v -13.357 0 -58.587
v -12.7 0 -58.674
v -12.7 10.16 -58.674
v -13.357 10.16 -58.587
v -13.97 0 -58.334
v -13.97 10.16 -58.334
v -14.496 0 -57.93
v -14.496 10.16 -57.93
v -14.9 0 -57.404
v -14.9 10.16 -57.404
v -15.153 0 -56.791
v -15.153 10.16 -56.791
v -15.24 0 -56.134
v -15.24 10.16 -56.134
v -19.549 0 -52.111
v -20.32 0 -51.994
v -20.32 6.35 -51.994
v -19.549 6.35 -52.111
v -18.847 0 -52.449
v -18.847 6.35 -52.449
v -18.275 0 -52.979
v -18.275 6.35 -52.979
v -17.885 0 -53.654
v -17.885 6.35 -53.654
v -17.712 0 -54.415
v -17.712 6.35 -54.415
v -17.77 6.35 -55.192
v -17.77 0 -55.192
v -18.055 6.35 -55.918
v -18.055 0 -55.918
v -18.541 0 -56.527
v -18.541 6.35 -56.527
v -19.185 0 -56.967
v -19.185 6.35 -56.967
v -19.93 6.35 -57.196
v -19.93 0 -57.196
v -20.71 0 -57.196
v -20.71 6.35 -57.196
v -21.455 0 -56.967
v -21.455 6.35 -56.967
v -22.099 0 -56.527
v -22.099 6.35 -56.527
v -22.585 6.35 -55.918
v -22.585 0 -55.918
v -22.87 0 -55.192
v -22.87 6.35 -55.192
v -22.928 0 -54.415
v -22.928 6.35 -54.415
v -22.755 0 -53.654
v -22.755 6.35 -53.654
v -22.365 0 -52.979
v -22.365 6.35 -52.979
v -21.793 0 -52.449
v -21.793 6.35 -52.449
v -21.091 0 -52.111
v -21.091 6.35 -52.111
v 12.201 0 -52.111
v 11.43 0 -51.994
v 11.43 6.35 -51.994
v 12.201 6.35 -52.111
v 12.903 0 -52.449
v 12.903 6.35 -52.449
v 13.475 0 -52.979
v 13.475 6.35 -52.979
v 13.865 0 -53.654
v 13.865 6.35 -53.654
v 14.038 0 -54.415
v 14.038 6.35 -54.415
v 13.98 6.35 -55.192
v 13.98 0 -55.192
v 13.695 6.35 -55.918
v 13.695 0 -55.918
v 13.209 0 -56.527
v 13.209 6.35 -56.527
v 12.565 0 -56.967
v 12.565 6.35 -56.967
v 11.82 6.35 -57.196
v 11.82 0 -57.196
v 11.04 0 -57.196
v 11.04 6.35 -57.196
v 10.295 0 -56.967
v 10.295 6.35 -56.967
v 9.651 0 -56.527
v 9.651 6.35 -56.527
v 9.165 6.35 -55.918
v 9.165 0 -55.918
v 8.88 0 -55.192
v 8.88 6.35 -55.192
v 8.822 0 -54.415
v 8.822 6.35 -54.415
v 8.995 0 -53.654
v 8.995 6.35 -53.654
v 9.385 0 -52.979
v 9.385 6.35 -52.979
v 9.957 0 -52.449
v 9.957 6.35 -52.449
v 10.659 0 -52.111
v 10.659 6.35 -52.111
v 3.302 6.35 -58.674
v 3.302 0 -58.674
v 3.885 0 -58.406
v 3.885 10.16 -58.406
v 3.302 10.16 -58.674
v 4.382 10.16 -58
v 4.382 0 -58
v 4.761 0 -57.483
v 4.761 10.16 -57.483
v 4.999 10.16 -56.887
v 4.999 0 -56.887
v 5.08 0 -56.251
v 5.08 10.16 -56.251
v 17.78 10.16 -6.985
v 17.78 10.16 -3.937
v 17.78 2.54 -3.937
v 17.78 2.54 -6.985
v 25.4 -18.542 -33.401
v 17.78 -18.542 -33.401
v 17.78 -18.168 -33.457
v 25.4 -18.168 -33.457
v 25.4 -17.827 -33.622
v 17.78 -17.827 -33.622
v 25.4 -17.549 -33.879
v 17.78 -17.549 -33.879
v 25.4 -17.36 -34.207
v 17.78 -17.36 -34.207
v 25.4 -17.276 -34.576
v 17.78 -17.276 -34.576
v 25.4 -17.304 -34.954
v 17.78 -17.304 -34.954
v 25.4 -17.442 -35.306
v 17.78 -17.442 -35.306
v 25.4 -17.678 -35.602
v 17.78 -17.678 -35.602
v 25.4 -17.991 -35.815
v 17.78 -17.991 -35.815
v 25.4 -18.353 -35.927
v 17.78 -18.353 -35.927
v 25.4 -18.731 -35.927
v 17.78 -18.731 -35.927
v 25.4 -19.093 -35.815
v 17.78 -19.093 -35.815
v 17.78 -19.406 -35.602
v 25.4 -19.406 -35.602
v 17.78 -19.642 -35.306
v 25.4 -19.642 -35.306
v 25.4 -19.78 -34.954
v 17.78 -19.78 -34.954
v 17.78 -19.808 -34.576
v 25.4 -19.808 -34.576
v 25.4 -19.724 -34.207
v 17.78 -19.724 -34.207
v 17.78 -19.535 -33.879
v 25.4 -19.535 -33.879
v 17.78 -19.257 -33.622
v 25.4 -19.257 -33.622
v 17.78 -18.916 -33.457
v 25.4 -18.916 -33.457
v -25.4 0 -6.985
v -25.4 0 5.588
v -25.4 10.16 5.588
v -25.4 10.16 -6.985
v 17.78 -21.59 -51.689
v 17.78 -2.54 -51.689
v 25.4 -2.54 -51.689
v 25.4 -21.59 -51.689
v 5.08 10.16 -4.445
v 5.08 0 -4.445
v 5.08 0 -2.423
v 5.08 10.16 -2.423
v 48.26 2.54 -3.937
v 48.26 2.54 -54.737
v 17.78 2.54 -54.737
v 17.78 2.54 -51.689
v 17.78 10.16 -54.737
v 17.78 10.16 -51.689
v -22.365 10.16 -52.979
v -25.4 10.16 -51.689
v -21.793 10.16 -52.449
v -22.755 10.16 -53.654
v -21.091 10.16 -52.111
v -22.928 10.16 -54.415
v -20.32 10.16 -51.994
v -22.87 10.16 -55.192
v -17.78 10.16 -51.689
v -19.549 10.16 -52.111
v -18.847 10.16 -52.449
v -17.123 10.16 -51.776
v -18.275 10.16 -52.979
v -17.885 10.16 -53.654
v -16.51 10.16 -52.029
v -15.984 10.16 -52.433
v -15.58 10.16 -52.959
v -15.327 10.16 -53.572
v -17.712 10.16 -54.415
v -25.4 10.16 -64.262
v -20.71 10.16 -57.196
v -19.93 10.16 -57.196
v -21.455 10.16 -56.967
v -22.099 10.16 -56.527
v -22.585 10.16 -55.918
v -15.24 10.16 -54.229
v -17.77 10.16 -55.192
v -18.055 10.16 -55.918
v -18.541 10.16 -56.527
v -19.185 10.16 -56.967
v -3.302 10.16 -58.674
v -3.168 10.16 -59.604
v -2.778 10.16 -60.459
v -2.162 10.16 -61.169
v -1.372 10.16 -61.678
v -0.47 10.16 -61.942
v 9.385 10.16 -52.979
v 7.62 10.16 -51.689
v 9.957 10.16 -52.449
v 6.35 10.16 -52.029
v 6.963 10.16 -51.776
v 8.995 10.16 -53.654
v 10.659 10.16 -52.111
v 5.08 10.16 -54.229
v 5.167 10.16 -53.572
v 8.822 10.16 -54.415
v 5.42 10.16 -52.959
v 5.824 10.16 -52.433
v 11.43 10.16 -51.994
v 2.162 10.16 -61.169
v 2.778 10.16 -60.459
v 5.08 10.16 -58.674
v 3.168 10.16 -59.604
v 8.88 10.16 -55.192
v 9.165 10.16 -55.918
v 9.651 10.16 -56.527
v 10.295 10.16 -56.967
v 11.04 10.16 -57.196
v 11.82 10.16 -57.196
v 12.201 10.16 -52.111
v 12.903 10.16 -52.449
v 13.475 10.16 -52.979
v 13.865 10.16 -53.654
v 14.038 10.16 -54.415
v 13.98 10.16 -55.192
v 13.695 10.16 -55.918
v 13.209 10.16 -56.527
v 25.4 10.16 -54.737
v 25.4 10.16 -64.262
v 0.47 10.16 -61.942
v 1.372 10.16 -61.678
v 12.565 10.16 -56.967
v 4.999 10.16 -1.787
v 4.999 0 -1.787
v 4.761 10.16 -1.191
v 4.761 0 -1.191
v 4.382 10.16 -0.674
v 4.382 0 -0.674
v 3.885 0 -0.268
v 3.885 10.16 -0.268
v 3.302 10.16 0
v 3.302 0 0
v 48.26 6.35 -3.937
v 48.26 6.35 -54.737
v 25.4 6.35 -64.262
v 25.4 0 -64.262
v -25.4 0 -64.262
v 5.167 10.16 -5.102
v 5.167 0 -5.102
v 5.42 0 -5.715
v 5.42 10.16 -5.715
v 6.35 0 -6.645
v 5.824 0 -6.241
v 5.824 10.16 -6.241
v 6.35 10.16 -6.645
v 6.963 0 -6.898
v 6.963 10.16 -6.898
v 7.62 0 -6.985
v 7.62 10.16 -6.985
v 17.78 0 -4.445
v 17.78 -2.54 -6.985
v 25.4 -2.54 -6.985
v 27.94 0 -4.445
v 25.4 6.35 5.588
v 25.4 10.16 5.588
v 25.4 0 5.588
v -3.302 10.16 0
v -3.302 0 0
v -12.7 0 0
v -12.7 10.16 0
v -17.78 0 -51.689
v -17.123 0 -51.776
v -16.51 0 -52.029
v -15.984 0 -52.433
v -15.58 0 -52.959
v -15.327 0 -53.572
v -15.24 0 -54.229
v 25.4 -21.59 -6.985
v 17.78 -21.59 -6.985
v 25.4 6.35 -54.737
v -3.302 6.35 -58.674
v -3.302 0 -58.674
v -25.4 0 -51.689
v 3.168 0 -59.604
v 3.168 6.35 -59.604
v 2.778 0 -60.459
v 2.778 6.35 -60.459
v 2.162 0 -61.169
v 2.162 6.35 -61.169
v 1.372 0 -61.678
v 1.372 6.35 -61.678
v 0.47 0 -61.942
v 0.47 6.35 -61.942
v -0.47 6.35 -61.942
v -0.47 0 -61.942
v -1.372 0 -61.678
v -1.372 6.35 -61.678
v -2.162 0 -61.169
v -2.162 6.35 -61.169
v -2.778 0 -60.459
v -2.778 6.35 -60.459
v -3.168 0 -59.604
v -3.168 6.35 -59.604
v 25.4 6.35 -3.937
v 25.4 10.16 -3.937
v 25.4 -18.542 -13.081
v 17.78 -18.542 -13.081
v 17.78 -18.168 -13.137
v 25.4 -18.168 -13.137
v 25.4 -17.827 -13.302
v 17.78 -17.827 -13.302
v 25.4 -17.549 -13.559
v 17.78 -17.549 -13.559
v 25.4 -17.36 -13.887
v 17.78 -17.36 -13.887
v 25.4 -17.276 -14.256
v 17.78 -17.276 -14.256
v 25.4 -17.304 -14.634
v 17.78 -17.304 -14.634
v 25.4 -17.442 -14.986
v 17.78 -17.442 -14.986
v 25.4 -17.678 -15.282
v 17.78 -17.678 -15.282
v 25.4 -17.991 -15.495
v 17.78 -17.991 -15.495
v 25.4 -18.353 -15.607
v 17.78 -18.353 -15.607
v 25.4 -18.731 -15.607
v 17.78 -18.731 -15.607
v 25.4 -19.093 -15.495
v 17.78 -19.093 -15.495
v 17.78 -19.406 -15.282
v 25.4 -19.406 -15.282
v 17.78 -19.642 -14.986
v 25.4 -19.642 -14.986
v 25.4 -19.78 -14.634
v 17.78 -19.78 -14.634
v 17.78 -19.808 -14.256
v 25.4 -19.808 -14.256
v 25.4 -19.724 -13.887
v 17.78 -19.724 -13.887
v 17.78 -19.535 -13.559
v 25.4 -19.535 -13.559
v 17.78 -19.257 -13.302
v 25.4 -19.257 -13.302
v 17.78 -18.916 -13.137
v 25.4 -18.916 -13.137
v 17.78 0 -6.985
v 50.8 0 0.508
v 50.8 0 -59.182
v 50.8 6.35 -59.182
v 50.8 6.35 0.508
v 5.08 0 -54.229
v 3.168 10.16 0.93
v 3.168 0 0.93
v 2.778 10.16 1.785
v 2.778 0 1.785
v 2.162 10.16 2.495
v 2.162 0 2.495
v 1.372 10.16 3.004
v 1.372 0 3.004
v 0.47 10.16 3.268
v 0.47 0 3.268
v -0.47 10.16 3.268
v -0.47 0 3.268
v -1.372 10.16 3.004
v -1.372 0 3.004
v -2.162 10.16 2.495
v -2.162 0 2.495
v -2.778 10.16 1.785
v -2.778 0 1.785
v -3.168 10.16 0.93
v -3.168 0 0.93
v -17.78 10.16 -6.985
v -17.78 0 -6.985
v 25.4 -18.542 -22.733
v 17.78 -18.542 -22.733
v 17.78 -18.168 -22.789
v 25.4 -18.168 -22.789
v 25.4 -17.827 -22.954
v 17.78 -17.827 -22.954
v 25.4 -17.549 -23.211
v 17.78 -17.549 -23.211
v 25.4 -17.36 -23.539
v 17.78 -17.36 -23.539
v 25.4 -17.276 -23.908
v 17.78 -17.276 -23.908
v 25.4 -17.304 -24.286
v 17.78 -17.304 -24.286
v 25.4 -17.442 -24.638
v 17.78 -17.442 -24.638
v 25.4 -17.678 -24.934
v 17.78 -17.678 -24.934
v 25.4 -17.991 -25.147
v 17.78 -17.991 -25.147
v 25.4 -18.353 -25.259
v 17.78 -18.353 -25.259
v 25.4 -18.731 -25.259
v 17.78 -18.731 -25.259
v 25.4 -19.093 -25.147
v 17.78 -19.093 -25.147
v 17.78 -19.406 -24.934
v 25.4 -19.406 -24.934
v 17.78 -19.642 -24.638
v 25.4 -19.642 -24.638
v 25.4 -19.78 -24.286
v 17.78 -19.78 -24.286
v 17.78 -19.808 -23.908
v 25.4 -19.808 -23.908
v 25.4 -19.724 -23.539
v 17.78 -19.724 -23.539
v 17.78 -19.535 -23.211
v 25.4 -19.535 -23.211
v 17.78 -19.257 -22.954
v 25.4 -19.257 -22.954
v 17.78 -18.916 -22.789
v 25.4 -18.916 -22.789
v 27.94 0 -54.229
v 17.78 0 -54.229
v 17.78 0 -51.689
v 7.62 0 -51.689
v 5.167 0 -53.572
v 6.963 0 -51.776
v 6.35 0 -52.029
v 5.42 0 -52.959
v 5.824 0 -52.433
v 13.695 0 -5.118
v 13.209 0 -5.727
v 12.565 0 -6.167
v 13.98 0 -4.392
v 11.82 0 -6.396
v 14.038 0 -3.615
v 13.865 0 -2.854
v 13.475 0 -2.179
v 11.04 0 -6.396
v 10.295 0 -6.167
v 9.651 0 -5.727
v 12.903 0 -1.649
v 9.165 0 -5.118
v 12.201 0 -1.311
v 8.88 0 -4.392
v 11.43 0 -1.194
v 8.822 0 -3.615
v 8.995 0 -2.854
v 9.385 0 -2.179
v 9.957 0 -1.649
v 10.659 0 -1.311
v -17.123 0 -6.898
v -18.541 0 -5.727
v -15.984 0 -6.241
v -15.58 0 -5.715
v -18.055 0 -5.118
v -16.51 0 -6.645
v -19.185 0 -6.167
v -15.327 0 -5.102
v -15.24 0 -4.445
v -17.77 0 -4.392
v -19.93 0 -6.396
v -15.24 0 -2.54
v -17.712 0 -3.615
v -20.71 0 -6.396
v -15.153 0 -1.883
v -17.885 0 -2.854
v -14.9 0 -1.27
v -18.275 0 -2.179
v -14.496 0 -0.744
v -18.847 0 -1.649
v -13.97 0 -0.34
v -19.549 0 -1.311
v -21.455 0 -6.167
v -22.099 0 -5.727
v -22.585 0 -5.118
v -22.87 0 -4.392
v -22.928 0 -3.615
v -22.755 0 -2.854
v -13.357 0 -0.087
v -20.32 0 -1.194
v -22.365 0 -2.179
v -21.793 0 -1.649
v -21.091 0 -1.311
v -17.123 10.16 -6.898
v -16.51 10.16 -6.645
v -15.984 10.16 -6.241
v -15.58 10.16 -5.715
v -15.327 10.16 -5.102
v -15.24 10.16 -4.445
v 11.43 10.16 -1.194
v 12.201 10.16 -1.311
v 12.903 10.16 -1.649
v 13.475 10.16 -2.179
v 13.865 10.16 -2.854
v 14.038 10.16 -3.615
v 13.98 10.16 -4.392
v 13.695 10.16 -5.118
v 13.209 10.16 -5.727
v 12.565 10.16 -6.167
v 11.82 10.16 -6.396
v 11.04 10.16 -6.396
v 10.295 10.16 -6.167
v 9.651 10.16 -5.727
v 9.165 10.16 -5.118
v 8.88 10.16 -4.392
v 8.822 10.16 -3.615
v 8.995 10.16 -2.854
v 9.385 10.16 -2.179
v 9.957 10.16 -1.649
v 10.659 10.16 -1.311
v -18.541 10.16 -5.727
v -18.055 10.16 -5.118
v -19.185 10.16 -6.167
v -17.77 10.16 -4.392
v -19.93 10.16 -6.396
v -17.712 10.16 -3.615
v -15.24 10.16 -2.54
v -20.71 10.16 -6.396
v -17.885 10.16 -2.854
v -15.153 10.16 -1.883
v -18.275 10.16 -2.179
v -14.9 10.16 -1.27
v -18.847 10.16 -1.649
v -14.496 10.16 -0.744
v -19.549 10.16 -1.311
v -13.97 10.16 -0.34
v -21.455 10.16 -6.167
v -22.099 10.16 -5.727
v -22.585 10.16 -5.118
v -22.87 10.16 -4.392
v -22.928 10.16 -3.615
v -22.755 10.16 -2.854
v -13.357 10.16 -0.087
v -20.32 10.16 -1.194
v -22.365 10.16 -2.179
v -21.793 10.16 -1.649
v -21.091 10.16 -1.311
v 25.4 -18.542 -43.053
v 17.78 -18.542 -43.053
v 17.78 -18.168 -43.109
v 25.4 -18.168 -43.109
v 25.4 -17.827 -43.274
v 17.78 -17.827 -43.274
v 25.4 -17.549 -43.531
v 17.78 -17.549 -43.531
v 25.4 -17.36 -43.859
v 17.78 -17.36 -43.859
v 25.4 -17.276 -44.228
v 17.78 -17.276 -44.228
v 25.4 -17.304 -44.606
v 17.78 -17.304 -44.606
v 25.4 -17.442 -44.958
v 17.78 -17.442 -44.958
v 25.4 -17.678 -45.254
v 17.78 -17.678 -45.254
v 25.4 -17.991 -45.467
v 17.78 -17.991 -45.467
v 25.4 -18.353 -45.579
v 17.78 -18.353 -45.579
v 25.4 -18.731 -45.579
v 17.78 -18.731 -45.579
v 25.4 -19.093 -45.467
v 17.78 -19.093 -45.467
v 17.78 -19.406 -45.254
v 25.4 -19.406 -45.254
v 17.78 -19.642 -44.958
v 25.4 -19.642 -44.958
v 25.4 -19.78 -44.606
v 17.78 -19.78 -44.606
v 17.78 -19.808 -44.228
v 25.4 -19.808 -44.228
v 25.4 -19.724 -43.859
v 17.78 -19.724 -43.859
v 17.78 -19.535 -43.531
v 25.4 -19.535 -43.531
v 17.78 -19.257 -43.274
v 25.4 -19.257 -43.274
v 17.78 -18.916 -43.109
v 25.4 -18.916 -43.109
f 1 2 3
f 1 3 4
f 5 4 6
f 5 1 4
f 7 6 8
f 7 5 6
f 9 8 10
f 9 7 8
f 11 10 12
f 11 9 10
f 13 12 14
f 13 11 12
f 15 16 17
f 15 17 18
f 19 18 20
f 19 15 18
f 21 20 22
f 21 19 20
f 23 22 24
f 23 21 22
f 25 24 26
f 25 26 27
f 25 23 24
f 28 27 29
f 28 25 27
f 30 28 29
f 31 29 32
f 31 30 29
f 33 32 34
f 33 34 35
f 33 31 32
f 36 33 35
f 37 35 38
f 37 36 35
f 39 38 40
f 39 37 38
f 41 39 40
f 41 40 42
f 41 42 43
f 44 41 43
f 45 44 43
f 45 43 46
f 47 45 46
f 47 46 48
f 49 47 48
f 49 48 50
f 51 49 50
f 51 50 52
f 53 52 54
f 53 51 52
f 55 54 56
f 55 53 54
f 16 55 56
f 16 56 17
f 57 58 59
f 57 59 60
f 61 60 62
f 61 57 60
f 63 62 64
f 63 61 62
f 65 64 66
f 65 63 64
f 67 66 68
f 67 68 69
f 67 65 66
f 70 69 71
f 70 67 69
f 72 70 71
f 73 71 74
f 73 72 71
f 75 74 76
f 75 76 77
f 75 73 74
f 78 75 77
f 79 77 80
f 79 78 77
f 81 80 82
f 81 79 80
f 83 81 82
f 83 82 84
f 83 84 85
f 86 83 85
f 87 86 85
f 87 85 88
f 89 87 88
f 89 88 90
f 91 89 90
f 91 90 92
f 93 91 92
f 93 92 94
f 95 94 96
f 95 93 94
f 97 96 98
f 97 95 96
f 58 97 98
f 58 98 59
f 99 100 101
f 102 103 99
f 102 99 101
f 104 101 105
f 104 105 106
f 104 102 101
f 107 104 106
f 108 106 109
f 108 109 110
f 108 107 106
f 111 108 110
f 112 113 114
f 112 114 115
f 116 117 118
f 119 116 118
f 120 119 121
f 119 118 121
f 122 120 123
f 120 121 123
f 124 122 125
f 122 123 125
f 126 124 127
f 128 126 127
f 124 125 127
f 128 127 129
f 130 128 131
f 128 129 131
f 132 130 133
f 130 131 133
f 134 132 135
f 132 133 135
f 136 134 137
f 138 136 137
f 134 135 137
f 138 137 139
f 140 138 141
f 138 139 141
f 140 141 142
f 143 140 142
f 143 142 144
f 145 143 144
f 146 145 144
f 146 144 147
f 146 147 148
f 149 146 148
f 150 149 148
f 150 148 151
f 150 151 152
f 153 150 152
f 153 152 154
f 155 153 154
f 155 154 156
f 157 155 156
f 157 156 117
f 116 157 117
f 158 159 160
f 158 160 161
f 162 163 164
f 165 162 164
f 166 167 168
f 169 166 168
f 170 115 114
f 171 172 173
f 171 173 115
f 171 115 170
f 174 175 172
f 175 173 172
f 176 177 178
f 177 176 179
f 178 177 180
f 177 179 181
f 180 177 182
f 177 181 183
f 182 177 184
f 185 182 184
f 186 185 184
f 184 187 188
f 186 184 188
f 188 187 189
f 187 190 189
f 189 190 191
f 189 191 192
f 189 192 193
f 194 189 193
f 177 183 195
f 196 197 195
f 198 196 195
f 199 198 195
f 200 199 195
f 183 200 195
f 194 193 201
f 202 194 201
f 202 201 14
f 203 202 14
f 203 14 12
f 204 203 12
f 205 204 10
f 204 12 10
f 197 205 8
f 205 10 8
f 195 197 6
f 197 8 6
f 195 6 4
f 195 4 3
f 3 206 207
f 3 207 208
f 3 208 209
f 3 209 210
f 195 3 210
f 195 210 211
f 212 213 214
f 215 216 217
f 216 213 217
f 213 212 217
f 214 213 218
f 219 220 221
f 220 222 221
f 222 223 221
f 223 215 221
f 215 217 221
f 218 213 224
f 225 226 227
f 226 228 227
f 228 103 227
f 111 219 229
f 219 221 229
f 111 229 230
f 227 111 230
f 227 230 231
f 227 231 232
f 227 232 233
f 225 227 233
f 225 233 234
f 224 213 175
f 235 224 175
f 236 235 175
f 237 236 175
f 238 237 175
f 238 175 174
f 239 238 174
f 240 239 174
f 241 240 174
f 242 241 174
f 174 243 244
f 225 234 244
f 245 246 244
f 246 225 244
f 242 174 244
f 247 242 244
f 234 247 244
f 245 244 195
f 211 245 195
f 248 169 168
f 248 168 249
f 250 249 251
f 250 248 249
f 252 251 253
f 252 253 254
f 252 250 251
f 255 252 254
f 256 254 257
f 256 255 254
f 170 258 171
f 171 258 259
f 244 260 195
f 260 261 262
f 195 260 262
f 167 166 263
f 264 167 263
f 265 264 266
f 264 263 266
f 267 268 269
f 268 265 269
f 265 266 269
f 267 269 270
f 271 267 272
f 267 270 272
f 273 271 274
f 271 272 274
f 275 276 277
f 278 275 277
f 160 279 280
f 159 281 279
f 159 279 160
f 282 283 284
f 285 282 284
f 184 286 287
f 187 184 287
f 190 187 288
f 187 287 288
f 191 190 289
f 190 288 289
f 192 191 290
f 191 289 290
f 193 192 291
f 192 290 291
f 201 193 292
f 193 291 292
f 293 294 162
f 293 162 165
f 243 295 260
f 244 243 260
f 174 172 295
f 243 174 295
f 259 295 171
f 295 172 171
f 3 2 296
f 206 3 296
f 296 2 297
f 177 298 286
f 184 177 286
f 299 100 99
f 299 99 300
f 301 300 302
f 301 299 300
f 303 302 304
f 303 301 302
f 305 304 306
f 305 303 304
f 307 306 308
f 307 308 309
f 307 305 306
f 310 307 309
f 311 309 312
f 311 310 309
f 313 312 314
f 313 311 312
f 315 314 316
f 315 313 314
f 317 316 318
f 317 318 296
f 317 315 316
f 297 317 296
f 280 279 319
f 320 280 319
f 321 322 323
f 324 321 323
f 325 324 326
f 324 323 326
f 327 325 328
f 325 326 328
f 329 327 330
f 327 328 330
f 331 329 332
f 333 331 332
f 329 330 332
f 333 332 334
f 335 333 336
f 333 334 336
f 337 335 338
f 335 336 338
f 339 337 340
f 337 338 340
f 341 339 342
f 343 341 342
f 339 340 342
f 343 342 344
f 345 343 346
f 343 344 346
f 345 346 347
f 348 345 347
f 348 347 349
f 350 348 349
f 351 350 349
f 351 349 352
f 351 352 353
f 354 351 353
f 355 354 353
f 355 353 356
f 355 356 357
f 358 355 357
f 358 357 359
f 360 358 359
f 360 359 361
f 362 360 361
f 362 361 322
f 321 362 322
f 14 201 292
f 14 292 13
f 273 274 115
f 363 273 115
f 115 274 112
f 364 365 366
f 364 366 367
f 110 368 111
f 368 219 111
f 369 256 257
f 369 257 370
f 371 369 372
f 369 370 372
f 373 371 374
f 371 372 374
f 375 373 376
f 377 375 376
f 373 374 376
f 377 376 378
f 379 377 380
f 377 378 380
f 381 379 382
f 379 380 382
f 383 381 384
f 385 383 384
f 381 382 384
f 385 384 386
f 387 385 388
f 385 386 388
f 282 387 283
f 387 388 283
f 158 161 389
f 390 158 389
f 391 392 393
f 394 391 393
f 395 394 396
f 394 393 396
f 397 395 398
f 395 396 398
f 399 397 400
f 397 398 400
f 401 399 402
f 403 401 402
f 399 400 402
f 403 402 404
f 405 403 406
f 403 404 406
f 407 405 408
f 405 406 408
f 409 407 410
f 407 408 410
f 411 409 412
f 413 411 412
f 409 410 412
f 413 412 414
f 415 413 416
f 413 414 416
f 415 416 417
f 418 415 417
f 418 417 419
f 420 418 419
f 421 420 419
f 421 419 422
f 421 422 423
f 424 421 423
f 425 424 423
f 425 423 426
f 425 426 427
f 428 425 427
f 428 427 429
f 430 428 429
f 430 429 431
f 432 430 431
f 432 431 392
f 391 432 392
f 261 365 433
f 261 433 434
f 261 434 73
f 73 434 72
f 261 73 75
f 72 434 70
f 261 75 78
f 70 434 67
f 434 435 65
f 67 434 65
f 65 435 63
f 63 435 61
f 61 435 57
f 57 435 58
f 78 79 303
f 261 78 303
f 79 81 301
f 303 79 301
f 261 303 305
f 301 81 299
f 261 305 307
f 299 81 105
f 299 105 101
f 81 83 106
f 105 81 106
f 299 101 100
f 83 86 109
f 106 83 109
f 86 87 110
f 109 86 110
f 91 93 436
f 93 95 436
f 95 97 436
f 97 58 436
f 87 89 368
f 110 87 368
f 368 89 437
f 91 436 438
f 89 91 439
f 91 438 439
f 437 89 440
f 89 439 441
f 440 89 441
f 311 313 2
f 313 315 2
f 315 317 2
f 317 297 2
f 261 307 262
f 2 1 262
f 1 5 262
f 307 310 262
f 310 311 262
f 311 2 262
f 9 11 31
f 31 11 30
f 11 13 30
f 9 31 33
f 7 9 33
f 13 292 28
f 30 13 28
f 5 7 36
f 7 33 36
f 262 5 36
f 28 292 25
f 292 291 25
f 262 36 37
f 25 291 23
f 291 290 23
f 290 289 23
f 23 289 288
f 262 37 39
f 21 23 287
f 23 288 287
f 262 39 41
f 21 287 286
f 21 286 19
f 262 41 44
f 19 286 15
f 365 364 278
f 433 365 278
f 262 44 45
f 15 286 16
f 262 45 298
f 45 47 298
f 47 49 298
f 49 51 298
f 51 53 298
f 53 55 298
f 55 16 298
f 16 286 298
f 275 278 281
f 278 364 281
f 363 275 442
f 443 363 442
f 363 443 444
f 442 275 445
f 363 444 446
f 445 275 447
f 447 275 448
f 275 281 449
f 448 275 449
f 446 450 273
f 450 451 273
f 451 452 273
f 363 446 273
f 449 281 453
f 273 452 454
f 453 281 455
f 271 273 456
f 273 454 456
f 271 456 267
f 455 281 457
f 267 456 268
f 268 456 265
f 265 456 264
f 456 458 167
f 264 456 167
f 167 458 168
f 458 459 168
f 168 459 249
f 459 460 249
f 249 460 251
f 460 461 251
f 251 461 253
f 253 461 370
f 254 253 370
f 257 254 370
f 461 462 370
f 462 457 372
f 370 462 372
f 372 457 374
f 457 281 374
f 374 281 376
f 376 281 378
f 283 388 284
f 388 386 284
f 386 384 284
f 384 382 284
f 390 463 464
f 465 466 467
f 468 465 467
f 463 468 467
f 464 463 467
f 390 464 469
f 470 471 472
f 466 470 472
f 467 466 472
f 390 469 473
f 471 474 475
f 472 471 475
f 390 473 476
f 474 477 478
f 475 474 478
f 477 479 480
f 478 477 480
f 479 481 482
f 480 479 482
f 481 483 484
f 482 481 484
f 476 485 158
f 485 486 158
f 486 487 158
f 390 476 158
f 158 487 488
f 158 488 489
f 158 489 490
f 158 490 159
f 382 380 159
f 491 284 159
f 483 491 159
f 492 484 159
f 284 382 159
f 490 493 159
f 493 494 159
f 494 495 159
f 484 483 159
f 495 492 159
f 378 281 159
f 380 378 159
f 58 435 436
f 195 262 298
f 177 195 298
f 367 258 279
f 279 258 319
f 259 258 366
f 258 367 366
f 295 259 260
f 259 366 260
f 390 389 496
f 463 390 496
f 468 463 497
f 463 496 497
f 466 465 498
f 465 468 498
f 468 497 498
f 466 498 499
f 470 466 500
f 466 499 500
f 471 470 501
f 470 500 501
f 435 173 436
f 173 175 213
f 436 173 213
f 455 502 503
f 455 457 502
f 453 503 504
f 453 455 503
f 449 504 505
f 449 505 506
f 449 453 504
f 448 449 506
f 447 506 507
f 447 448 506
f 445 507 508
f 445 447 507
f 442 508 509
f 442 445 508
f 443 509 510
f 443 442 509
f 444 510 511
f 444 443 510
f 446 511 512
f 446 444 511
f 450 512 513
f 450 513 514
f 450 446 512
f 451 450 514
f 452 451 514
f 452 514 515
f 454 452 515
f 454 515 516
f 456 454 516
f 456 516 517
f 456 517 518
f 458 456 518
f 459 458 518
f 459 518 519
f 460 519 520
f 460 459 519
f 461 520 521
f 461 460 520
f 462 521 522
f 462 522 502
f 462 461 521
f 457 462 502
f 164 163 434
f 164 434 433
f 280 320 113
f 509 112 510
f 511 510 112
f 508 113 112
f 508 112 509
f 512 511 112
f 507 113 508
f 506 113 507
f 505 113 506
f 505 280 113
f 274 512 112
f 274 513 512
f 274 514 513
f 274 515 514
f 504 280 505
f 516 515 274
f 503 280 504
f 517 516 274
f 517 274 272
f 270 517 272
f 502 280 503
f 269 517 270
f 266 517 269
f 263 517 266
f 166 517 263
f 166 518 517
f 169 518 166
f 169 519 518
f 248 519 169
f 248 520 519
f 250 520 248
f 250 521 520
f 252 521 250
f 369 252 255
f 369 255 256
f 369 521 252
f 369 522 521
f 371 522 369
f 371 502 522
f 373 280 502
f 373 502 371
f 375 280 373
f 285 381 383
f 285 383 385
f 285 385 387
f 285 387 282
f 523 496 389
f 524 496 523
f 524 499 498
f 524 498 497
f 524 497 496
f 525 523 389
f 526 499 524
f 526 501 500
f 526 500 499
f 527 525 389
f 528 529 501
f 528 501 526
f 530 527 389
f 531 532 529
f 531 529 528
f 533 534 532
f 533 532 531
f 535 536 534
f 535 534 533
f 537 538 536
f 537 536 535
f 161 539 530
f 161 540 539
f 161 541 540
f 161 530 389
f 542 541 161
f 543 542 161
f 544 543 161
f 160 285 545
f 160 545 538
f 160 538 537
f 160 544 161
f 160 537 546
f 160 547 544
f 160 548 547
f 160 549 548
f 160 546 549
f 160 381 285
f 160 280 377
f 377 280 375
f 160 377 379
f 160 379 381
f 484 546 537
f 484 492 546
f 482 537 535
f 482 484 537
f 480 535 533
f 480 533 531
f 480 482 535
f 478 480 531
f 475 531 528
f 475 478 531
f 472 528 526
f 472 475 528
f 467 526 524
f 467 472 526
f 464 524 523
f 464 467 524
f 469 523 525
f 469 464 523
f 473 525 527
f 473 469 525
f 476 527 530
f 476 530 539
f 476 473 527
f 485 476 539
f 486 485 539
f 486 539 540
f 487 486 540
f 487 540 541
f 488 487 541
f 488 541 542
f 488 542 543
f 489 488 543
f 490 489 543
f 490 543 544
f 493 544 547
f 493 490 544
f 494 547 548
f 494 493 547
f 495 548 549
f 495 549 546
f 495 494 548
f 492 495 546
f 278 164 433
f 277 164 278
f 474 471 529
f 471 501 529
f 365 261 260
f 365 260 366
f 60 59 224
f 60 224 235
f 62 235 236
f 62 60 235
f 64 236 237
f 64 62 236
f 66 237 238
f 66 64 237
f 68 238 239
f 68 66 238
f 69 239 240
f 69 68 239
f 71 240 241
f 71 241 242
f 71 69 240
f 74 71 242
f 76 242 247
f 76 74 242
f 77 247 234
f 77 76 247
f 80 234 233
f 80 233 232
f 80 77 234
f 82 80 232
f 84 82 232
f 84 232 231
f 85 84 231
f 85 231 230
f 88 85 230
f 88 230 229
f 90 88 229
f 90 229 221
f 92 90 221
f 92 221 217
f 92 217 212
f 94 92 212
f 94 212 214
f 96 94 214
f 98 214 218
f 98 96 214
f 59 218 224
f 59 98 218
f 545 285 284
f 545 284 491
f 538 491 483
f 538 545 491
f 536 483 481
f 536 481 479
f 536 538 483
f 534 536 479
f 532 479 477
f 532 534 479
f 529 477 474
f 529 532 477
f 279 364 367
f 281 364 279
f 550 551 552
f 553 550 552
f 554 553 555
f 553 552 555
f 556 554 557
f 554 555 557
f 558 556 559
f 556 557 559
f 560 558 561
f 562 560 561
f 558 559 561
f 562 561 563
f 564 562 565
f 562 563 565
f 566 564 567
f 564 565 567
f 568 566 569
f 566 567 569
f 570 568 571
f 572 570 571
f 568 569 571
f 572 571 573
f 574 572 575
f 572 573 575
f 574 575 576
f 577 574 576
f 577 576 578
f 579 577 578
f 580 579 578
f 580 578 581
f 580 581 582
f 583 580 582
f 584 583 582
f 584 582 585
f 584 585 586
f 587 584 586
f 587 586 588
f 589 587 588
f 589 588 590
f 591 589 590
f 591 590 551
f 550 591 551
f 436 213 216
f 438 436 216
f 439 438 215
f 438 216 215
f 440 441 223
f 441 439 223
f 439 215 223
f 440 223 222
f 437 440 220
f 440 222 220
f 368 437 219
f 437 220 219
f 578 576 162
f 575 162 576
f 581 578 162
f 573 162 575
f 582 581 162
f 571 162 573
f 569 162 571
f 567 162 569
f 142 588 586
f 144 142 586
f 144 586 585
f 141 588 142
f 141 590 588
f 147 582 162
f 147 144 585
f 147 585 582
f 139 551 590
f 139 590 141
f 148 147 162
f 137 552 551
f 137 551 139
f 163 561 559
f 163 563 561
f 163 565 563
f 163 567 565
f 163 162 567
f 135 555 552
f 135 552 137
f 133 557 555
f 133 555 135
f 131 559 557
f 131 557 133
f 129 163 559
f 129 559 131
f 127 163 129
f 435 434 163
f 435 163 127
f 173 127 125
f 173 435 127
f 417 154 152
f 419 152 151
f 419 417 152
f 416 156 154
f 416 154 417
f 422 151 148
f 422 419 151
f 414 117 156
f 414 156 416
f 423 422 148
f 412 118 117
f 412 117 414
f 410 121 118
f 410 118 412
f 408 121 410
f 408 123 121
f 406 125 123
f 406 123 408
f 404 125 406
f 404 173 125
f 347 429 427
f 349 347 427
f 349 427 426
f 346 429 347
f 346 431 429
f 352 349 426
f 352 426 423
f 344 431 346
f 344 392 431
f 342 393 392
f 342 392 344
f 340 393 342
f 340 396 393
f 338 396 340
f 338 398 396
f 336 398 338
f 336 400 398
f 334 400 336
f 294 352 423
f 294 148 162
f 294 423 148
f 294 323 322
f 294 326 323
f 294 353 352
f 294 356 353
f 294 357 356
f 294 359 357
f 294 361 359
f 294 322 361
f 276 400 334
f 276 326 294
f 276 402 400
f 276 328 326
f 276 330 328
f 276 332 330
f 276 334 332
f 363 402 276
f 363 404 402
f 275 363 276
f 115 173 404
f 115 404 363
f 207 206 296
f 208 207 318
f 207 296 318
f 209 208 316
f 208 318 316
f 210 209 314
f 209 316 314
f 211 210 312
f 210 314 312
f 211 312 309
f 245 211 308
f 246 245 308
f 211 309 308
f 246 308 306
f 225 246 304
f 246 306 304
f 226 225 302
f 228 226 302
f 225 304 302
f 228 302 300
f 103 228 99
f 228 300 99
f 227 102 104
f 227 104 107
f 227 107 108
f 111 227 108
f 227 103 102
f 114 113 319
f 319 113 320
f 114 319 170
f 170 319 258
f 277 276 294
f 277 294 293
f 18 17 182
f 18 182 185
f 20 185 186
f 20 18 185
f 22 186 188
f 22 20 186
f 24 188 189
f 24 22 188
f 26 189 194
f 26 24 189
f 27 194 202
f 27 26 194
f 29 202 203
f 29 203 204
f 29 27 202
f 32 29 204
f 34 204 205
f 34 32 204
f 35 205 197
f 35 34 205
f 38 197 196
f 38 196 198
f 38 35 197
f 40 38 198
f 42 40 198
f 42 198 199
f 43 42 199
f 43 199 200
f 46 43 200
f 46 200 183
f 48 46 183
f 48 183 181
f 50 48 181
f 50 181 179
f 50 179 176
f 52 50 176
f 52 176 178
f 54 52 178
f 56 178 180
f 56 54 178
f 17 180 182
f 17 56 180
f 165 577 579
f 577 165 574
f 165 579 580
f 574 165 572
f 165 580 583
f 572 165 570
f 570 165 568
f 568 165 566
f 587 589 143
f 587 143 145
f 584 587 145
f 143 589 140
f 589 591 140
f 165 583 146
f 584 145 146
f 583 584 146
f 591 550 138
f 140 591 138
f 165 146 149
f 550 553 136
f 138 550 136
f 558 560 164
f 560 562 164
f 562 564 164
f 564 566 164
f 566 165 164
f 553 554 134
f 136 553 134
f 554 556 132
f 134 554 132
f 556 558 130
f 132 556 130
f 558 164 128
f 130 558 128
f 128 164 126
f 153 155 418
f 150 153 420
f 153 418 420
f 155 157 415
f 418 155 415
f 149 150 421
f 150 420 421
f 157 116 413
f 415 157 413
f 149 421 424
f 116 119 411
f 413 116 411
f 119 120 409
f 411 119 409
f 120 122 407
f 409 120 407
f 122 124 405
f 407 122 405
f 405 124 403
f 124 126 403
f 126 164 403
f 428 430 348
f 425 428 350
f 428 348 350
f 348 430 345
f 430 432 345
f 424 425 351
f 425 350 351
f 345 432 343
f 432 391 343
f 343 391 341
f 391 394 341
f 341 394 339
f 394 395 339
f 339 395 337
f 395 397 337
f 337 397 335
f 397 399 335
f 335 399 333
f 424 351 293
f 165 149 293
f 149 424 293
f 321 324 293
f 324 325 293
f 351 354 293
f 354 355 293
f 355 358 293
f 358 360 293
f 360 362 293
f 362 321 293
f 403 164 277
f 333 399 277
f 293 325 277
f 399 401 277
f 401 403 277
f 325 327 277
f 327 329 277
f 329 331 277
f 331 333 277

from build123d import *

# Parameters (mm, degrees)
SKETCH1_R           = 3.302
SKETCH1_R_2         = 2.615549664
BOSS_EXTRUDE1_DEPTH = 6.35
SKETCH2_W           = 30.48
SKETCH2_H           = 50.8
CUT_EXTRUDE1_DEPTH  = 3.81
CUT_EXTRUDE2_DEPTH  = 83.161835082
SKETCH13_R          = 2.615549664
BOSS_EXTRUDE7_DEPTH = 3.81
SKETCH15_W          = 7.62
SKETCH15_H          = 44.704
BOSS_EXTRUDE8_DEPTH = 21.59
SKETCH16_R          = 1.27
CUT_EXTRUDE3_DEPTH  = 81.375650193
FILLET1_R           = 2.54
CHAMFER2_SIZE       = 2.54


with BuildPart() as part:
    # Sketch1 → Boss-Extrude1 (new body)
    with BuildSketch(Plane(origin=(0, 0, 0), x_dir=(1, 0, 0), z_dir=(0, 1, 0))):
        Polygon((50.8, -0.508), (25.4, -5.588), (-25.4, -5.588), (-25.4, 64.262), (25.4, 64.262), (50.8, 59.182), align=None)
        with Locations(Location((0, 0, 0), (0, 0, 270))):
            Circle(SKETCH1_R, mode=Mode.SUBTRACT)
        with Locations(Location((0, 58.674, 0), (0, 0, 270))):
            Circle(SKETCH1_R, mode=Mode.SUBTRACT)
        with Locations(Location((11.43, 54.61, 0), (0, 0, 270))):
            Circle(SKETCH1_R_2, mode=Mode.SUBTRACT)
        with Locations(Location((-20.32, 54.61, 0), (0, 0, 270))):
            Circle(SKETCH1_R_2, mode=Mode.SUBTRACT)
        with Locations(Location((-20.32, 3.81, 0), (0, 0, 270))):
            Circle(SKETCH1_R_2, mode=Mode.SUBTRACT)
        with Locations(Location((11.43, 3.81, 0), (0, 0, 270))):
            Circle(SKETCH1_R_2, mode=Mode.SUBTRACT)
    extrude(amount=BOSS_EXTRUDE1_DEPTH)

    # Sketch2 → Cut-Extrude1 (cut)
    with BuildSketch(Plane(origin=(0, 6.35, 0), x_dir=(1, 0, 0), z_dir=(0, 1, 0))):
        with Locations((33.02, 29.337)):
            Rectangle(SKETCH2_W, SKETCH2_H)
    extrude(amount=-CUT_EXTRUDE1_DEPTH, mode=Mode.SUBTRACT)

    # Sketch3 → Cut-Extrude2 (cut, through all)
    with BuildSketch(Plane(origin=(0, 6.35, 0), x_dir=(1, 0, 0), z_dir=(0, 1, 0))):
        with BuildLine():
            Line((-15.24, 58.674), (-15.24, 51.689))
            Line((-15.24, 51.689), (5.08, 51.689))
            Line((5.08, 51.689), (5.08, 58.674))
            Line((5.08, 58.674), (3.302, 58.674))
            ThreePointArc((3.302, 58.674), (0, 55.372), (-3.302, 58.674))
            Line((-3.302, 58.674), (-15.24, 58.674))
        make_face()
        Polygon((-15.24, 51.689), (-25.4, 51.689), (-25.4, 6.985), (-15.24, 6.985), (5.08, 6.985), (17.78, 6.985), (17.78, 51.689), (5.08, 51.689), align=None)
        with BuildLine():
            Line((5.08, 6.985), (-15.24, 6.985))
            Line((-15.24, 6.985), (-15.24, 0))
            Line((-15.24, 0), (-3.302, 0))
            ThreePointArc((-3.302, 0), (0, 3.302), (3.302, 0))
            Line((3.302, 0), (5.08, 0))
            Line((5.08, 0), (5.08, 6.985))
        make_face()
    extrude(amount=-CUT_EXTRUDE2_DEPTH, mode=Mode.SUBTRACT)

    # Sketch13 → Boss-Extrude7 (add)
    # profile 1 of 2: a face of its own
    with BuildSketch(Plane(origin=(0, 6.35, 0), x_dir=(1, 0, 0), z_dir=(0, 1, 0))):
        with BuildLine():
            Line((-25.4, 64.262), (-25.4, 51.689))
            Line((-25.4, 51.689), (-15.24, 51.689))
            Line((-15.24, 51.689), (-15.24, 58.674))
            Line((-15.24, 58.674), (-3.302, 58.674))
            ThreePointArc((-3.302, 58.674), (0, 61.976), (3.302, 58.674))
            Line((3.302, 58.674), (5.08, 58.674))
            Line((5.08, 58.674), (5.08, 51.689))
            Line((5.08, 51.689), (17.78, 51.689))
            Line((17.78, 51.689), (17.78, 54.737))
            Line((17.78, 54.737), (25.4, 54.737))
            Line((25.4, 54.737), (25.4, 64.262))
            Line((25.4, 64.262), (-25.4, 64.262))
        make_face()
        with Locations(Location((-20.32, 54.61, 0), (0, 0, 270))):
            Circle(SKETCH13_R, mode=Mode.SUBTRACT)
        with Locations(Location((11.43, 54.61, 0), (0, 0, 270))):
            Circle(SKETCH13_R, mode=Mode.SUBTRACT)
    # profile 2 of 2: a face of its own
    with BuildSketch(Plane(origin=(0, 6.35, 0), x_dir=(1, 0, 0), z_dir=(0, 1, 0))):
        with BuildLine():
            Line((-15.24, 6.985), (-25.4, 6.985))
            Line((-25.4, 6.985), (-25.4, -5.588))
            Line((-25.4, -5.588), (25.4, -5.588))
            Line((25.4, -5.588), (25.4, 3.937))
            Line((25.4, 3.937), (17.78, 3.937))
            Line((17.78, 3.937), (17.78, 6.985))
            Line((17.78, 6.985), (5.08, 6.985))
            Line((5.08, 6.985), (5.08, 0))
            Line((5.08, 0), (3.302, 0))
            ThreePointArc((3.302, 0), (0, -3.302), (-3.302, 0))
            Line((-3.302, 0), (-15.24, 0))
            Line((-15.24, 0), (-15.24, 6.985))
        make_face()
        with Locations(Location((-20.32, 3.81, 0), (0, 0, 270))):
            Circle(SKETCH13_R, mode=Mode.SUBTRACT)
        with Locations(Location((11.43, 3.81, 0), (0, 0, 270))):
            Circle(SKETCH13_R, mode=Mode.SUBTRACT)
    extrude(amount=BOSS_EXTRUDE7_DEPTH)

    # Sketch15 → Boss-Extrude8 (add)
    with BuildSketch(Plane.XZ):
        with Locations((21.59, -29.337)):
            Rectangle(SKETCH15_W, SKETCH15_H)
    extrude(amount=BOSS_EXTRUDE8_DEPTH)

    # Sketch16 → Cut-Extrude3 (cut, through all)
    with BuildSketch(Plane.ZY.offset(-17.78)):
        with Locations((-44.323, -18.542)):
            Circle(SKETCH16_R)
        with Locations((-34.671, -18.542)):
            Circle(SKETCH16_R)
        with Locations((-24.003, -18.542)):
            Circle(SKETCH16_R)
        with Locations((-14.351, -18.542)):
            Circle(SKETCH16_R)
    extrude(amount=-CUT_EXTRUDE3_DEPTH, mode=Mode.SUBTRACT)

    # Fillet1
    # the kernel refuses this fillet: 2.54 mm, written as the material it adds along each edge
    with BuildSketch(Plane(origin=(-15.24, 0, -58.674), x_dir=(0, 0, 1), z_dir=(0, 1, 0))) as fillet1_piece_1:
        with BuildLine():
            CenterArc((FILLET1_R, FILLET1_R), FILLET1_R, 180, 90)
            Line((0, FILLET1_R), (0, 0))
            Line((0, 0), (FILLET1_R, 0))
        make_face()
    extrude(amount=10.16)
    with BuildSketch(Plane(origin=(5.08, 10.16, -58.674), x_dir=(-1, 0, 0), z_dir=(0, -1, 0))) as fillet1_piece_2:
        with BuildLine():
            CenterArc((2.54, -2.423005572), FILLET1_R, 107.457603124, 72.542396876)
            Line((0, -2.423005572), (0, 0))
            Line((0, 0), (1.778, 0))
        make_face()
    extrude(amount=10.16)
    with BuildSketch(Plane(origin=(5.08, 10.16, 0), x_dir=(0, 0, -1), z_dir=(0, -1, 0))) as fillet1_piece_3:
        with BuildLine():
            CenterArc((2.423005572, -2.54), FILLET1_R, 90, 72.542396876)
            Line((0, -1.778), (0, 0))
            Line((0, 0), (2.423005572, 0))
        make_face()
    extrude(amount=10.16)
    with BuildSketch(Plane(origin=(-15.24, 10.16, 0), x_dir=(1, 0, 0), z_dir=(0, -1, 0))) as fillet1_piece_4:
        with BuildLine():
            CenterArc((FILLET1_R, -FILLET1_R), FILLET1_R, 90, 90)
            Line((0, -FILLET1_R), (0, 0))
            Line((0, 0), (FILLET1_R, 0))
        make_face()
    extrude(amount=10.16)
    # the kernel refuses this fillet: 2.54 mm, written as the material it takes off along each edge
    with BuildSketch(Plane(origin=(-15.24, -6.35, -51.689), x_dir=(-1, 0, 0), z_dir=(0, 1, 0))) as fillet1_2_piece_1:
        with BuildLine():
            CenterArc((FILLET1_R, -FILLET1_R), FILLET1_R, 90, 90)
            Line((0, -FILLET1_R), (0, 0))
            Line((0, 0), (FILLET1_R, 0))
        make_face()
    extrude(amount=22.86, mode=Mode.SUBTRACT)
    with BuildSketch(Plane(origin=(5.08, 16.51, -51.689), x_dir=(0, 0, -1), z_dir=(0, -1, 0)), Plane(origin=(5.08, 16.51, -6.985), x_dir=(1, 0, 0), z_dir=(0, -1, 0)), Plane(origin=(-15.24, 16.51, -6.985), x_dir=(0, 0, 1), z_dir=(0, -1, 0))) as fillet1_2_piece_2:
        with BuildLine():
            CenterArc((FILLET1_R, FILLET1_R), FILLET1_R, 180, 90)
            Line((0, FILLET1_R), (0, 0))
            Line((0, 0), (FILLET1_R, 0))
        make_face()
    extrude(amount=22.86, mode=Mode.SUBTRACT)

    # Chamfer2
    chamfer2_edges = [part.edges().sort_by_distance(p)[0] for p in [
        (21.59, 0, -51.689),
        (25.4, 0, -29.337),
        (21.59, 0, -6.985),
    ]]
    chamfer(chamfer2_edges, length=CHAMFER2_SIZE)


solid = part.part
